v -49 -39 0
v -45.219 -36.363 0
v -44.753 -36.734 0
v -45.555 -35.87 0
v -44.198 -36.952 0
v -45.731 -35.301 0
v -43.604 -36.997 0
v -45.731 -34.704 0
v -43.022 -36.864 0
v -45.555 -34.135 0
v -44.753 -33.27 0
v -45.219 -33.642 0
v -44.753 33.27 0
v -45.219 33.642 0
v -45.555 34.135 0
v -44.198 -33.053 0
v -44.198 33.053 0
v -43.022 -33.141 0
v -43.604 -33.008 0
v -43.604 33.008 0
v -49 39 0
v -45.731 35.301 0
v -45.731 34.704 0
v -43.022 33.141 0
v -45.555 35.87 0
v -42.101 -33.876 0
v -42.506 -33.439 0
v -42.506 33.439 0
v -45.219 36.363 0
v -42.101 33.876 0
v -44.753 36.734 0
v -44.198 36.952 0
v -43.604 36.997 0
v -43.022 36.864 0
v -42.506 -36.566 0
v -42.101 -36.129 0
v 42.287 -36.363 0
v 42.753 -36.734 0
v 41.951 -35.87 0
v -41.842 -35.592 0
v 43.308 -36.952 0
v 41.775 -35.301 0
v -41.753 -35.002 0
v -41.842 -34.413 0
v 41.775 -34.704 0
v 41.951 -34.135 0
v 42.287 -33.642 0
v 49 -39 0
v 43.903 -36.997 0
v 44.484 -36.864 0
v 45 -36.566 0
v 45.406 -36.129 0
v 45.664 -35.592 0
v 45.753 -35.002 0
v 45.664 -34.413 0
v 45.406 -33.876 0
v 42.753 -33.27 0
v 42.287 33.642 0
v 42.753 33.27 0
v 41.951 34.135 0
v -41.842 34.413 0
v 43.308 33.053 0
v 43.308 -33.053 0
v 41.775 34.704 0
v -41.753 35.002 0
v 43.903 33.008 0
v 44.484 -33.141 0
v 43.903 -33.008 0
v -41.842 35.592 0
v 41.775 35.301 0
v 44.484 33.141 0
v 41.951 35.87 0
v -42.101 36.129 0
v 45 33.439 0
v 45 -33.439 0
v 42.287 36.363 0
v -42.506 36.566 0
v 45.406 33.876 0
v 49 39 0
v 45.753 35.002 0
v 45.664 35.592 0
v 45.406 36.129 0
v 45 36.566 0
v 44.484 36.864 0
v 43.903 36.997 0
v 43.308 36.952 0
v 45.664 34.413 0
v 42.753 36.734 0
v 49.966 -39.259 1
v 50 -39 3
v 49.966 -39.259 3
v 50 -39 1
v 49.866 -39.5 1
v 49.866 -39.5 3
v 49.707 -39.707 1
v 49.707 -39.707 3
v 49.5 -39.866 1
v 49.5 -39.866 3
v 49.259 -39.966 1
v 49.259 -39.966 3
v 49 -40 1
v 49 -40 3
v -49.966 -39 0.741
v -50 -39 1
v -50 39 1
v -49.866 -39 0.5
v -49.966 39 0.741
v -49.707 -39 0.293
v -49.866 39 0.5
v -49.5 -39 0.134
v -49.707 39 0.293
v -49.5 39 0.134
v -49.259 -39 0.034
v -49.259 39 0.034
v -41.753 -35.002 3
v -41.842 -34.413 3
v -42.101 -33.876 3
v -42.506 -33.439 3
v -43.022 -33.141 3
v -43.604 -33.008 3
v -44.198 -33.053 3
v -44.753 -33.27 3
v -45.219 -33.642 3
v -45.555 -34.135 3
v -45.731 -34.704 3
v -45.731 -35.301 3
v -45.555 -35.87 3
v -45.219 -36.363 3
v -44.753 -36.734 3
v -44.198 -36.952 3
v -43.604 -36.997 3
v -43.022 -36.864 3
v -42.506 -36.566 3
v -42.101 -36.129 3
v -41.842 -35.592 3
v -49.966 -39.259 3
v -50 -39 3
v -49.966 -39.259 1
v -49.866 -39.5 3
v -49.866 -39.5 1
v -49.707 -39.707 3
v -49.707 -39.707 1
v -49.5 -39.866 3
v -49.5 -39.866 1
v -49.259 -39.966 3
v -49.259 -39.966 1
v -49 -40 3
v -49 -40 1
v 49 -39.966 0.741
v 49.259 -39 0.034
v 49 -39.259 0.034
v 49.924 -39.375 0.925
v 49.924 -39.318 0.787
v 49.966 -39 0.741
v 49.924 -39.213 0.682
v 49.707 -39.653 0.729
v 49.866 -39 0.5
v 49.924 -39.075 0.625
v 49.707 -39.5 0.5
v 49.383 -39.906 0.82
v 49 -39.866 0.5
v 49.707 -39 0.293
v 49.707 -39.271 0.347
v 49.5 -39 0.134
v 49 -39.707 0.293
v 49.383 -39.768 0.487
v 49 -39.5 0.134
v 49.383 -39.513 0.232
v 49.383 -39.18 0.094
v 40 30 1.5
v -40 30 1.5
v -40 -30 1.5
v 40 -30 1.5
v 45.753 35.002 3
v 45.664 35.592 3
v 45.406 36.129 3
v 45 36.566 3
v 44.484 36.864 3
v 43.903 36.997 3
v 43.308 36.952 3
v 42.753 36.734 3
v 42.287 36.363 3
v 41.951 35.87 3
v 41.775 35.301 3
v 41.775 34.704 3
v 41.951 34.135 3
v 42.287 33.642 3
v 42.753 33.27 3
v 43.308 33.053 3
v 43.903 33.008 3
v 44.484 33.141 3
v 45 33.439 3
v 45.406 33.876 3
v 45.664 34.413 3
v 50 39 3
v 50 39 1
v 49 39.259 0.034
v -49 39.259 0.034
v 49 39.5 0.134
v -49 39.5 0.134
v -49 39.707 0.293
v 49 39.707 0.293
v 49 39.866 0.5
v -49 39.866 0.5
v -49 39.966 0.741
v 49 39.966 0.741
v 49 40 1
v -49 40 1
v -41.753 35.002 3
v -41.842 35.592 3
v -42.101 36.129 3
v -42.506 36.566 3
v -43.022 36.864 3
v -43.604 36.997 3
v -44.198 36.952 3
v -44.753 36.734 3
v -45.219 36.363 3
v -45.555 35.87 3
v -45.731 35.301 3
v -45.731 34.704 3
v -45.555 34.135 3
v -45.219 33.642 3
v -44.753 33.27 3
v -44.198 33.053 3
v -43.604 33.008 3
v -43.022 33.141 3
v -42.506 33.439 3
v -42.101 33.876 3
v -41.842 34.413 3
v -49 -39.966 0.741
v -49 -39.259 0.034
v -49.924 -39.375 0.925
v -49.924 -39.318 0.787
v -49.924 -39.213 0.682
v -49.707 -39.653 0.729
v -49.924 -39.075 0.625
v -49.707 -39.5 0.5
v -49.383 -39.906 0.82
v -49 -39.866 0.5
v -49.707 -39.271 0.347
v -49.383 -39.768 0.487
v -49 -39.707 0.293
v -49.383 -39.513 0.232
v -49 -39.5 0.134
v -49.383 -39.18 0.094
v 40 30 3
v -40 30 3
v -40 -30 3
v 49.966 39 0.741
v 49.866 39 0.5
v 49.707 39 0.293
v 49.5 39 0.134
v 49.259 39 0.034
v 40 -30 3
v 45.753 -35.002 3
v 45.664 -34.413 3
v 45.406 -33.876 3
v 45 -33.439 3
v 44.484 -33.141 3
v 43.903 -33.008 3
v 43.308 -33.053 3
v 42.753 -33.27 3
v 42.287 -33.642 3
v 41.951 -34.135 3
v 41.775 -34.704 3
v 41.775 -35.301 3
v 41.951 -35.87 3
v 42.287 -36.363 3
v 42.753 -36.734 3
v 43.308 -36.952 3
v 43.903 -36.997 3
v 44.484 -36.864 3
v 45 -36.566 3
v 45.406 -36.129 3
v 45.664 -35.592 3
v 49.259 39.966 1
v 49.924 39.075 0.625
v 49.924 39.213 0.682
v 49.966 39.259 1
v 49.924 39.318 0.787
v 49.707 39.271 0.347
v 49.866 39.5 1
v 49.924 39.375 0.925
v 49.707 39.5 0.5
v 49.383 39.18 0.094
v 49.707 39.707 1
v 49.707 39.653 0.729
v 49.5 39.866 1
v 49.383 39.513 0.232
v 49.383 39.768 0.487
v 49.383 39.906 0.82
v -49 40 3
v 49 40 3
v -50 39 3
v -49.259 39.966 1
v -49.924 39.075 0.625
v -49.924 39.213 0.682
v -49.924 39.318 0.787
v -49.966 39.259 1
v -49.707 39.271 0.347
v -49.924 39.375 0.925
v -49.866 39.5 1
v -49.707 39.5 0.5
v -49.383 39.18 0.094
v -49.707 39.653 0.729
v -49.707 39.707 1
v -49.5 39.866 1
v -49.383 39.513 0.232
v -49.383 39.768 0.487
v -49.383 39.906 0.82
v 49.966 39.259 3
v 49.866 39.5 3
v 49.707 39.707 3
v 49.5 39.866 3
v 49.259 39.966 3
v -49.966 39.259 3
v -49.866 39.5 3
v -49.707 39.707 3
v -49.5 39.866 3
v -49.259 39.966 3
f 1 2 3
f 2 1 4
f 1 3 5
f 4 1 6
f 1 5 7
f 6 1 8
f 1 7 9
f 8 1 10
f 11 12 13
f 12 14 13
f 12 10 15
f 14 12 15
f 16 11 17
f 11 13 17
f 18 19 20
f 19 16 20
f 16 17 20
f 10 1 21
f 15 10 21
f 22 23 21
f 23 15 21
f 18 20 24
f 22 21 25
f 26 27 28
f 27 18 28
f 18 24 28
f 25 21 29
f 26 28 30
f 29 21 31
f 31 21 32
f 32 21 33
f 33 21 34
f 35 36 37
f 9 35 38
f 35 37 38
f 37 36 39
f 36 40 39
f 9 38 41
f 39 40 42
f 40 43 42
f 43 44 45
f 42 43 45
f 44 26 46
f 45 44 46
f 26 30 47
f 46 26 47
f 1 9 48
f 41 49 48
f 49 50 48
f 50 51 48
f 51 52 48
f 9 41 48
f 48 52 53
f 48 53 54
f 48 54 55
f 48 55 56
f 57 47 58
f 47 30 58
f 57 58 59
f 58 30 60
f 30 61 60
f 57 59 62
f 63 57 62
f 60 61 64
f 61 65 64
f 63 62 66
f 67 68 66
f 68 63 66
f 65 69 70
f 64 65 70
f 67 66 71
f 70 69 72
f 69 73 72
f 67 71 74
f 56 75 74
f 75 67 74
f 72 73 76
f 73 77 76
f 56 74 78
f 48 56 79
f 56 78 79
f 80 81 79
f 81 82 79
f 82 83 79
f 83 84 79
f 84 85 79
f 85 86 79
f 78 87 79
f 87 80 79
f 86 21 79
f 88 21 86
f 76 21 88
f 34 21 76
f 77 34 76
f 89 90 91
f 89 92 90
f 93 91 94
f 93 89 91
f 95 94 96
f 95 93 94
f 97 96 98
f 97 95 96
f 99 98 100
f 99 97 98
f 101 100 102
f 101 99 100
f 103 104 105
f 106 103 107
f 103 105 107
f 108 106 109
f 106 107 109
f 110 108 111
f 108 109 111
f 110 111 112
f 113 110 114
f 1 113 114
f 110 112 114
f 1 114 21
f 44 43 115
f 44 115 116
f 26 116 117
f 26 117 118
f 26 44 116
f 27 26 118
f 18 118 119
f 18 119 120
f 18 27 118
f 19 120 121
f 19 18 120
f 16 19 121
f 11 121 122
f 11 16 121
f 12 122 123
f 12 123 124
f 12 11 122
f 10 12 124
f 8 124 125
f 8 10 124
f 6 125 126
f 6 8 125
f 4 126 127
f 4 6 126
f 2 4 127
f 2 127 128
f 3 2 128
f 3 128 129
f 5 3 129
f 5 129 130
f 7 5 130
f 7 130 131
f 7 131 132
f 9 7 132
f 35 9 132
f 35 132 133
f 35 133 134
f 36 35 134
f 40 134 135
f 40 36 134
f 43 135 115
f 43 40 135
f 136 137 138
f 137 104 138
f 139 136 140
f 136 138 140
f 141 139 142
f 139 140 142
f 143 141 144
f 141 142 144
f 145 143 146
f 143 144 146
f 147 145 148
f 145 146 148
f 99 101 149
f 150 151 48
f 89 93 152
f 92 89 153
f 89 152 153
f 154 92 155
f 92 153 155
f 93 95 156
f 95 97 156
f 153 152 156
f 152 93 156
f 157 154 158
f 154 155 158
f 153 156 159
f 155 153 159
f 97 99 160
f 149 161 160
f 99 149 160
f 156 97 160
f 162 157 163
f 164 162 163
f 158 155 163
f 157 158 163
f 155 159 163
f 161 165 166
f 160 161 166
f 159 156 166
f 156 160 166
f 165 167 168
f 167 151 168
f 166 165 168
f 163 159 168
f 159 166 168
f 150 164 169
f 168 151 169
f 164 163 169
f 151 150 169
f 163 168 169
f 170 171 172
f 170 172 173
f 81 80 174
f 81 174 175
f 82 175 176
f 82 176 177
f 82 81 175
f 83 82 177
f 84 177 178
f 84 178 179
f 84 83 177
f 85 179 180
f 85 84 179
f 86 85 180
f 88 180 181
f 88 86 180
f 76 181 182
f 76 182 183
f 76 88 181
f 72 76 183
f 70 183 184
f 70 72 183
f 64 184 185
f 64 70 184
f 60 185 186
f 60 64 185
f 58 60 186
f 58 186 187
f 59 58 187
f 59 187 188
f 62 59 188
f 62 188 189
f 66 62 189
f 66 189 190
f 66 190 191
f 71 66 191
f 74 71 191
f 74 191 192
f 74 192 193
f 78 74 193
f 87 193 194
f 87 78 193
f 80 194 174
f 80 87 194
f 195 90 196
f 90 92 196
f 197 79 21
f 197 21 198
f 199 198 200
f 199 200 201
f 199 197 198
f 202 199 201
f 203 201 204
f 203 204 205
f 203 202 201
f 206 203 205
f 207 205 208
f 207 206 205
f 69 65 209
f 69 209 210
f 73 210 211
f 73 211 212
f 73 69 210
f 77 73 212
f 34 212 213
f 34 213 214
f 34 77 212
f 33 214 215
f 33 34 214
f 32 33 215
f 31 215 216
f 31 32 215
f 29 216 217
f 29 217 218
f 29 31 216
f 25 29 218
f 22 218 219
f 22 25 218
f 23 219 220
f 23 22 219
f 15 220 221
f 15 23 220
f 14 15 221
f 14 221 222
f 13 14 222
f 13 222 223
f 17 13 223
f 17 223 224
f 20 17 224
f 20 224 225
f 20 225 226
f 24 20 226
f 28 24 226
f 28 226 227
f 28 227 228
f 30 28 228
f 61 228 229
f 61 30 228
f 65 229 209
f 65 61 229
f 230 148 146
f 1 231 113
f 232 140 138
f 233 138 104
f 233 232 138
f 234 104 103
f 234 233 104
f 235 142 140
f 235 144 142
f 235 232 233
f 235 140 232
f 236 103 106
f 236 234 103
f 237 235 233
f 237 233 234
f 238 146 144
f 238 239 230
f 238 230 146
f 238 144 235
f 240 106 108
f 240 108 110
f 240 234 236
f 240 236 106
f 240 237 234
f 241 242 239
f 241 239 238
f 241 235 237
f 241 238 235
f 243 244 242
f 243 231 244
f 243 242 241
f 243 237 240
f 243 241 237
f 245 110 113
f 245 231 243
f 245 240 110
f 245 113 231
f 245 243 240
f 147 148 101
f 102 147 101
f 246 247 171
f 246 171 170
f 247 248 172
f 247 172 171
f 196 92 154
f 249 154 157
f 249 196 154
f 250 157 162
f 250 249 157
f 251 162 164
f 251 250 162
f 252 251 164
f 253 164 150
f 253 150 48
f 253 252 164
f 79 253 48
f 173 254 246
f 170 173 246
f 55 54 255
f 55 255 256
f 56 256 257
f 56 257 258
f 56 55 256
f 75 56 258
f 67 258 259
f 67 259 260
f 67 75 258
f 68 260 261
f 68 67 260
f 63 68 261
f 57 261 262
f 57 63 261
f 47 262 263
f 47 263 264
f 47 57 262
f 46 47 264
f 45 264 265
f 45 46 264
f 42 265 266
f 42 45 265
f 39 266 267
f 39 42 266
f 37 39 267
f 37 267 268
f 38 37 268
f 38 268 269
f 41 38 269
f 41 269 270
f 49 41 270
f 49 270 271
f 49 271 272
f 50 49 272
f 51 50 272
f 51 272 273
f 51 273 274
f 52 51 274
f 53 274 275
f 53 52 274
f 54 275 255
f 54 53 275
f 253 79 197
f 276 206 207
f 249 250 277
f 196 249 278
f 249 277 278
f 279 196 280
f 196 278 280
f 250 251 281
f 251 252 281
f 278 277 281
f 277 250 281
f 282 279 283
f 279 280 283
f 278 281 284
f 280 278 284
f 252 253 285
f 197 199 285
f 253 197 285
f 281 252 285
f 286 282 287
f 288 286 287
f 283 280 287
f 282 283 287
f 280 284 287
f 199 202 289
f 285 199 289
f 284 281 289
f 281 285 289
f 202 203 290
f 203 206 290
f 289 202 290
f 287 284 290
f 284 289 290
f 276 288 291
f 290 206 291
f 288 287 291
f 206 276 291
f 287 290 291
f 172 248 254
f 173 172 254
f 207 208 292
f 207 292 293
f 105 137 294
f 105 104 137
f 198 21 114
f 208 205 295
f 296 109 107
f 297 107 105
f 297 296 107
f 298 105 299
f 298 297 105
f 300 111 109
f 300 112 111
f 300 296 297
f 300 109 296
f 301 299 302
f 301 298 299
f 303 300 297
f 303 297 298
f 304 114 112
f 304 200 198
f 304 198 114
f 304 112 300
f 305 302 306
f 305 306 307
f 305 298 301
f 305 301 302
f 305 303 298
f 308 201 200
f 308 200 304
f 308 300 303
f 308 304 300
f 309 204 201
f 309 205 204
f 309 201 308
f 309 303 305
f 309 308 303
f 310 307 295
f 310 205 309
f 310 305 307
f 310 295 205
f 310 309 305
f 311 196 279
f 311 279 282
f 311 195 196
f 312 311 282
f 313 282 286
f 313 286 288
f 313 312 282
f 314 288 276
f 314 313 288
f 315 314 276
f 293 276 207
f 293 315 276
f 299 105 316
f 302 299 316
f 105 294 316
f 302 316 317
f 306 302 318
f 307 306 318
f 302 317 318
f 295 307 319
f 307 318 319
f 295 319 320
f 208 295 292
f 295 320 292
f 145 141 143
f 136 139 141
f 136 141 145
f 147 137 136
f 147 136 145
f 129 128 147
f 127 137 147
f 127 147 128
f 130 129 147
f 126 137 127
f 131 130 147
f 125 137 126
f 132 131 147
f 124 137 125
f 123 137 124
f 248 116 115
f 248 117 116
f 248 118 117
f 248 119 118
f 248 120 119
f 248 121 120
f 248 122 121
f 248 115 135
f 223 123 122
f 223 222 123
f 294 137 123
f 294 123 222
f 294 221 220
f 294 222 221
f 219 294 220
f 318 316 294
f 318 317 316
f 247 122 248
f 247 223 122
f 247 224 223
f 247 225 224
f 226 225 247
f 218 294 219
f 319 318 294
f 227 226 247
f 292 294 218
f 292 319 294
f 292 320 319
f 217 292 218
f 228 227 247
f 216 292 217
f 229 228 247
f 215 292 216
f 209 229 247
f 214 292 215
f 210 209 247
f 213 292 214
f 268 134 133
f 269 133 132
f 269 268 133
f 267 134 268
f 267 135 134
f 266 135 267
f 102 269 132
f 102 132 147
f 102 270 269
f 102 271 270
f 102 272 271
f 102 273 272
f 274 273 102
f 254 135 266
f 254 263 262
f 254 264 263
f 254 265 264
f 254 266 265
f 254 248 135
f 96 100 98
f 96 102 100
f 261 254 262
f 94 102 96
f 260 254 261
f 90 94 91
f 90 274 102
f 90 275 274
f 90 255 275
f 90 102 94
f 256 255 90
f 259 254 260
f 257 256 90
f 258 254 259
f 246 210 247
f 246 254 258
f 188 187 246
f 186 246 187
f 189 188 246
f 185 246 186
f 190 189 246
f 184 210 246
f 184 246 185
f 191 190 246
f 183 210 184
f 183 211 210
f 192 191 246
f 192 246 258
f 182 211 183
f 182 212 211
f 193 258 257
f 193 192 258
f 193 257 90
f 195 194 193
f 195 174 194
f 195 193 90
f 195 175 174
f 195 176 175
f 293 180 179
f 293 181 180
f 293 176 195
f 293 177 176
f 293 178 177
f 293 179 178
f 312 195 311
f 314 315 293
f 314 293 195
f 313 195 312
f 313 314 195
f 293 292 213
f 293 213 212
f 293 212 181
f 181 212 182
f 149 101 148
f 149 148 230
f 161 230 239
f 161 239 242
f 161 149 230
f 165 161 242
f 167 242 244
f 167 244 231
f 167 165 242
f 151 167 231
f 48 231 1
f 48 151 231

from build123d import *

# Parameters (mm, degrees)
SKETCH_W     = 100
SKETCH_H     = 80
SKETCH_R     = 2
PAD_DEPTH    = 3
SKETCH002_W  = 80
SKETCH002_H  = 60
POCKET_DEPTH = 1.5
FILLET_R     = 1
FILLET001_R  = 1
FILLET002_R  = 1
FILLET003_R  = 1


with BuildPart() as part:
    # Sketch → Pad (new body)
    with BuildSketch(Plane.XY):
        Rectangle(SKETCH_W, SKETCH_H)
        with Locations((-43.75305, -35.00244)):
            Circle(SKETCH_R, mode=Mode.SUBTRACT)
        with Locations((43.75305, 35.00244)):
            Circle(SKETCH_R, mode=Mode.SUBTRACT)
        with Locations((-43.75305, 35.00244)):
            Circle(SKETCH_R, mode=Mode.SUBTRACT)
        with Locations((43.75305, -35.00244)):
            Circle(SKETCH_R, mode=Mode.SUBTRACT)
    extrude(amount=PAD_DEPTH)

    # Sketch002 (on Face10 of Pad) → Pocket (cut)
    with BuildSketch(Plane.XY.offset(3)):
        Rectangle(SKETCH002_W, SKETCH002_H)
    extrude(amount=-POCKET_DEPTH, mode=Mode.SUBTRACT)

    # Fillet
    fillet_edges = [part.edges().sort_by_distance(p)[0] for p in [
        (0, -40, 0),
    ]]
    fillet(fillet_edges, radius=FILLET_R)

    # Fillet001
    fillet001_edges = [part.edges().sort_by_distance(p)[0] for p in [
        (0, 40, 0),
    ]]
    fillet(fillet001_edges, radius=FILLET001_R)

    # Fillet002
    fillet002_edges = [part.edges().sort_by_distance(p)[0] for p in [
        (-50, 0, 0),
    ]]
    fillet(fillet002_edges, radius=FILLET002_R)

    # Fillet003
    fillet003_edges = [part.edges().sort_by_distance(p)[0] for p in [
        (50, 0, 0),
    ]]
    fillet(fillet003_edges, radius=FILLET003_R)


solid = part.part
